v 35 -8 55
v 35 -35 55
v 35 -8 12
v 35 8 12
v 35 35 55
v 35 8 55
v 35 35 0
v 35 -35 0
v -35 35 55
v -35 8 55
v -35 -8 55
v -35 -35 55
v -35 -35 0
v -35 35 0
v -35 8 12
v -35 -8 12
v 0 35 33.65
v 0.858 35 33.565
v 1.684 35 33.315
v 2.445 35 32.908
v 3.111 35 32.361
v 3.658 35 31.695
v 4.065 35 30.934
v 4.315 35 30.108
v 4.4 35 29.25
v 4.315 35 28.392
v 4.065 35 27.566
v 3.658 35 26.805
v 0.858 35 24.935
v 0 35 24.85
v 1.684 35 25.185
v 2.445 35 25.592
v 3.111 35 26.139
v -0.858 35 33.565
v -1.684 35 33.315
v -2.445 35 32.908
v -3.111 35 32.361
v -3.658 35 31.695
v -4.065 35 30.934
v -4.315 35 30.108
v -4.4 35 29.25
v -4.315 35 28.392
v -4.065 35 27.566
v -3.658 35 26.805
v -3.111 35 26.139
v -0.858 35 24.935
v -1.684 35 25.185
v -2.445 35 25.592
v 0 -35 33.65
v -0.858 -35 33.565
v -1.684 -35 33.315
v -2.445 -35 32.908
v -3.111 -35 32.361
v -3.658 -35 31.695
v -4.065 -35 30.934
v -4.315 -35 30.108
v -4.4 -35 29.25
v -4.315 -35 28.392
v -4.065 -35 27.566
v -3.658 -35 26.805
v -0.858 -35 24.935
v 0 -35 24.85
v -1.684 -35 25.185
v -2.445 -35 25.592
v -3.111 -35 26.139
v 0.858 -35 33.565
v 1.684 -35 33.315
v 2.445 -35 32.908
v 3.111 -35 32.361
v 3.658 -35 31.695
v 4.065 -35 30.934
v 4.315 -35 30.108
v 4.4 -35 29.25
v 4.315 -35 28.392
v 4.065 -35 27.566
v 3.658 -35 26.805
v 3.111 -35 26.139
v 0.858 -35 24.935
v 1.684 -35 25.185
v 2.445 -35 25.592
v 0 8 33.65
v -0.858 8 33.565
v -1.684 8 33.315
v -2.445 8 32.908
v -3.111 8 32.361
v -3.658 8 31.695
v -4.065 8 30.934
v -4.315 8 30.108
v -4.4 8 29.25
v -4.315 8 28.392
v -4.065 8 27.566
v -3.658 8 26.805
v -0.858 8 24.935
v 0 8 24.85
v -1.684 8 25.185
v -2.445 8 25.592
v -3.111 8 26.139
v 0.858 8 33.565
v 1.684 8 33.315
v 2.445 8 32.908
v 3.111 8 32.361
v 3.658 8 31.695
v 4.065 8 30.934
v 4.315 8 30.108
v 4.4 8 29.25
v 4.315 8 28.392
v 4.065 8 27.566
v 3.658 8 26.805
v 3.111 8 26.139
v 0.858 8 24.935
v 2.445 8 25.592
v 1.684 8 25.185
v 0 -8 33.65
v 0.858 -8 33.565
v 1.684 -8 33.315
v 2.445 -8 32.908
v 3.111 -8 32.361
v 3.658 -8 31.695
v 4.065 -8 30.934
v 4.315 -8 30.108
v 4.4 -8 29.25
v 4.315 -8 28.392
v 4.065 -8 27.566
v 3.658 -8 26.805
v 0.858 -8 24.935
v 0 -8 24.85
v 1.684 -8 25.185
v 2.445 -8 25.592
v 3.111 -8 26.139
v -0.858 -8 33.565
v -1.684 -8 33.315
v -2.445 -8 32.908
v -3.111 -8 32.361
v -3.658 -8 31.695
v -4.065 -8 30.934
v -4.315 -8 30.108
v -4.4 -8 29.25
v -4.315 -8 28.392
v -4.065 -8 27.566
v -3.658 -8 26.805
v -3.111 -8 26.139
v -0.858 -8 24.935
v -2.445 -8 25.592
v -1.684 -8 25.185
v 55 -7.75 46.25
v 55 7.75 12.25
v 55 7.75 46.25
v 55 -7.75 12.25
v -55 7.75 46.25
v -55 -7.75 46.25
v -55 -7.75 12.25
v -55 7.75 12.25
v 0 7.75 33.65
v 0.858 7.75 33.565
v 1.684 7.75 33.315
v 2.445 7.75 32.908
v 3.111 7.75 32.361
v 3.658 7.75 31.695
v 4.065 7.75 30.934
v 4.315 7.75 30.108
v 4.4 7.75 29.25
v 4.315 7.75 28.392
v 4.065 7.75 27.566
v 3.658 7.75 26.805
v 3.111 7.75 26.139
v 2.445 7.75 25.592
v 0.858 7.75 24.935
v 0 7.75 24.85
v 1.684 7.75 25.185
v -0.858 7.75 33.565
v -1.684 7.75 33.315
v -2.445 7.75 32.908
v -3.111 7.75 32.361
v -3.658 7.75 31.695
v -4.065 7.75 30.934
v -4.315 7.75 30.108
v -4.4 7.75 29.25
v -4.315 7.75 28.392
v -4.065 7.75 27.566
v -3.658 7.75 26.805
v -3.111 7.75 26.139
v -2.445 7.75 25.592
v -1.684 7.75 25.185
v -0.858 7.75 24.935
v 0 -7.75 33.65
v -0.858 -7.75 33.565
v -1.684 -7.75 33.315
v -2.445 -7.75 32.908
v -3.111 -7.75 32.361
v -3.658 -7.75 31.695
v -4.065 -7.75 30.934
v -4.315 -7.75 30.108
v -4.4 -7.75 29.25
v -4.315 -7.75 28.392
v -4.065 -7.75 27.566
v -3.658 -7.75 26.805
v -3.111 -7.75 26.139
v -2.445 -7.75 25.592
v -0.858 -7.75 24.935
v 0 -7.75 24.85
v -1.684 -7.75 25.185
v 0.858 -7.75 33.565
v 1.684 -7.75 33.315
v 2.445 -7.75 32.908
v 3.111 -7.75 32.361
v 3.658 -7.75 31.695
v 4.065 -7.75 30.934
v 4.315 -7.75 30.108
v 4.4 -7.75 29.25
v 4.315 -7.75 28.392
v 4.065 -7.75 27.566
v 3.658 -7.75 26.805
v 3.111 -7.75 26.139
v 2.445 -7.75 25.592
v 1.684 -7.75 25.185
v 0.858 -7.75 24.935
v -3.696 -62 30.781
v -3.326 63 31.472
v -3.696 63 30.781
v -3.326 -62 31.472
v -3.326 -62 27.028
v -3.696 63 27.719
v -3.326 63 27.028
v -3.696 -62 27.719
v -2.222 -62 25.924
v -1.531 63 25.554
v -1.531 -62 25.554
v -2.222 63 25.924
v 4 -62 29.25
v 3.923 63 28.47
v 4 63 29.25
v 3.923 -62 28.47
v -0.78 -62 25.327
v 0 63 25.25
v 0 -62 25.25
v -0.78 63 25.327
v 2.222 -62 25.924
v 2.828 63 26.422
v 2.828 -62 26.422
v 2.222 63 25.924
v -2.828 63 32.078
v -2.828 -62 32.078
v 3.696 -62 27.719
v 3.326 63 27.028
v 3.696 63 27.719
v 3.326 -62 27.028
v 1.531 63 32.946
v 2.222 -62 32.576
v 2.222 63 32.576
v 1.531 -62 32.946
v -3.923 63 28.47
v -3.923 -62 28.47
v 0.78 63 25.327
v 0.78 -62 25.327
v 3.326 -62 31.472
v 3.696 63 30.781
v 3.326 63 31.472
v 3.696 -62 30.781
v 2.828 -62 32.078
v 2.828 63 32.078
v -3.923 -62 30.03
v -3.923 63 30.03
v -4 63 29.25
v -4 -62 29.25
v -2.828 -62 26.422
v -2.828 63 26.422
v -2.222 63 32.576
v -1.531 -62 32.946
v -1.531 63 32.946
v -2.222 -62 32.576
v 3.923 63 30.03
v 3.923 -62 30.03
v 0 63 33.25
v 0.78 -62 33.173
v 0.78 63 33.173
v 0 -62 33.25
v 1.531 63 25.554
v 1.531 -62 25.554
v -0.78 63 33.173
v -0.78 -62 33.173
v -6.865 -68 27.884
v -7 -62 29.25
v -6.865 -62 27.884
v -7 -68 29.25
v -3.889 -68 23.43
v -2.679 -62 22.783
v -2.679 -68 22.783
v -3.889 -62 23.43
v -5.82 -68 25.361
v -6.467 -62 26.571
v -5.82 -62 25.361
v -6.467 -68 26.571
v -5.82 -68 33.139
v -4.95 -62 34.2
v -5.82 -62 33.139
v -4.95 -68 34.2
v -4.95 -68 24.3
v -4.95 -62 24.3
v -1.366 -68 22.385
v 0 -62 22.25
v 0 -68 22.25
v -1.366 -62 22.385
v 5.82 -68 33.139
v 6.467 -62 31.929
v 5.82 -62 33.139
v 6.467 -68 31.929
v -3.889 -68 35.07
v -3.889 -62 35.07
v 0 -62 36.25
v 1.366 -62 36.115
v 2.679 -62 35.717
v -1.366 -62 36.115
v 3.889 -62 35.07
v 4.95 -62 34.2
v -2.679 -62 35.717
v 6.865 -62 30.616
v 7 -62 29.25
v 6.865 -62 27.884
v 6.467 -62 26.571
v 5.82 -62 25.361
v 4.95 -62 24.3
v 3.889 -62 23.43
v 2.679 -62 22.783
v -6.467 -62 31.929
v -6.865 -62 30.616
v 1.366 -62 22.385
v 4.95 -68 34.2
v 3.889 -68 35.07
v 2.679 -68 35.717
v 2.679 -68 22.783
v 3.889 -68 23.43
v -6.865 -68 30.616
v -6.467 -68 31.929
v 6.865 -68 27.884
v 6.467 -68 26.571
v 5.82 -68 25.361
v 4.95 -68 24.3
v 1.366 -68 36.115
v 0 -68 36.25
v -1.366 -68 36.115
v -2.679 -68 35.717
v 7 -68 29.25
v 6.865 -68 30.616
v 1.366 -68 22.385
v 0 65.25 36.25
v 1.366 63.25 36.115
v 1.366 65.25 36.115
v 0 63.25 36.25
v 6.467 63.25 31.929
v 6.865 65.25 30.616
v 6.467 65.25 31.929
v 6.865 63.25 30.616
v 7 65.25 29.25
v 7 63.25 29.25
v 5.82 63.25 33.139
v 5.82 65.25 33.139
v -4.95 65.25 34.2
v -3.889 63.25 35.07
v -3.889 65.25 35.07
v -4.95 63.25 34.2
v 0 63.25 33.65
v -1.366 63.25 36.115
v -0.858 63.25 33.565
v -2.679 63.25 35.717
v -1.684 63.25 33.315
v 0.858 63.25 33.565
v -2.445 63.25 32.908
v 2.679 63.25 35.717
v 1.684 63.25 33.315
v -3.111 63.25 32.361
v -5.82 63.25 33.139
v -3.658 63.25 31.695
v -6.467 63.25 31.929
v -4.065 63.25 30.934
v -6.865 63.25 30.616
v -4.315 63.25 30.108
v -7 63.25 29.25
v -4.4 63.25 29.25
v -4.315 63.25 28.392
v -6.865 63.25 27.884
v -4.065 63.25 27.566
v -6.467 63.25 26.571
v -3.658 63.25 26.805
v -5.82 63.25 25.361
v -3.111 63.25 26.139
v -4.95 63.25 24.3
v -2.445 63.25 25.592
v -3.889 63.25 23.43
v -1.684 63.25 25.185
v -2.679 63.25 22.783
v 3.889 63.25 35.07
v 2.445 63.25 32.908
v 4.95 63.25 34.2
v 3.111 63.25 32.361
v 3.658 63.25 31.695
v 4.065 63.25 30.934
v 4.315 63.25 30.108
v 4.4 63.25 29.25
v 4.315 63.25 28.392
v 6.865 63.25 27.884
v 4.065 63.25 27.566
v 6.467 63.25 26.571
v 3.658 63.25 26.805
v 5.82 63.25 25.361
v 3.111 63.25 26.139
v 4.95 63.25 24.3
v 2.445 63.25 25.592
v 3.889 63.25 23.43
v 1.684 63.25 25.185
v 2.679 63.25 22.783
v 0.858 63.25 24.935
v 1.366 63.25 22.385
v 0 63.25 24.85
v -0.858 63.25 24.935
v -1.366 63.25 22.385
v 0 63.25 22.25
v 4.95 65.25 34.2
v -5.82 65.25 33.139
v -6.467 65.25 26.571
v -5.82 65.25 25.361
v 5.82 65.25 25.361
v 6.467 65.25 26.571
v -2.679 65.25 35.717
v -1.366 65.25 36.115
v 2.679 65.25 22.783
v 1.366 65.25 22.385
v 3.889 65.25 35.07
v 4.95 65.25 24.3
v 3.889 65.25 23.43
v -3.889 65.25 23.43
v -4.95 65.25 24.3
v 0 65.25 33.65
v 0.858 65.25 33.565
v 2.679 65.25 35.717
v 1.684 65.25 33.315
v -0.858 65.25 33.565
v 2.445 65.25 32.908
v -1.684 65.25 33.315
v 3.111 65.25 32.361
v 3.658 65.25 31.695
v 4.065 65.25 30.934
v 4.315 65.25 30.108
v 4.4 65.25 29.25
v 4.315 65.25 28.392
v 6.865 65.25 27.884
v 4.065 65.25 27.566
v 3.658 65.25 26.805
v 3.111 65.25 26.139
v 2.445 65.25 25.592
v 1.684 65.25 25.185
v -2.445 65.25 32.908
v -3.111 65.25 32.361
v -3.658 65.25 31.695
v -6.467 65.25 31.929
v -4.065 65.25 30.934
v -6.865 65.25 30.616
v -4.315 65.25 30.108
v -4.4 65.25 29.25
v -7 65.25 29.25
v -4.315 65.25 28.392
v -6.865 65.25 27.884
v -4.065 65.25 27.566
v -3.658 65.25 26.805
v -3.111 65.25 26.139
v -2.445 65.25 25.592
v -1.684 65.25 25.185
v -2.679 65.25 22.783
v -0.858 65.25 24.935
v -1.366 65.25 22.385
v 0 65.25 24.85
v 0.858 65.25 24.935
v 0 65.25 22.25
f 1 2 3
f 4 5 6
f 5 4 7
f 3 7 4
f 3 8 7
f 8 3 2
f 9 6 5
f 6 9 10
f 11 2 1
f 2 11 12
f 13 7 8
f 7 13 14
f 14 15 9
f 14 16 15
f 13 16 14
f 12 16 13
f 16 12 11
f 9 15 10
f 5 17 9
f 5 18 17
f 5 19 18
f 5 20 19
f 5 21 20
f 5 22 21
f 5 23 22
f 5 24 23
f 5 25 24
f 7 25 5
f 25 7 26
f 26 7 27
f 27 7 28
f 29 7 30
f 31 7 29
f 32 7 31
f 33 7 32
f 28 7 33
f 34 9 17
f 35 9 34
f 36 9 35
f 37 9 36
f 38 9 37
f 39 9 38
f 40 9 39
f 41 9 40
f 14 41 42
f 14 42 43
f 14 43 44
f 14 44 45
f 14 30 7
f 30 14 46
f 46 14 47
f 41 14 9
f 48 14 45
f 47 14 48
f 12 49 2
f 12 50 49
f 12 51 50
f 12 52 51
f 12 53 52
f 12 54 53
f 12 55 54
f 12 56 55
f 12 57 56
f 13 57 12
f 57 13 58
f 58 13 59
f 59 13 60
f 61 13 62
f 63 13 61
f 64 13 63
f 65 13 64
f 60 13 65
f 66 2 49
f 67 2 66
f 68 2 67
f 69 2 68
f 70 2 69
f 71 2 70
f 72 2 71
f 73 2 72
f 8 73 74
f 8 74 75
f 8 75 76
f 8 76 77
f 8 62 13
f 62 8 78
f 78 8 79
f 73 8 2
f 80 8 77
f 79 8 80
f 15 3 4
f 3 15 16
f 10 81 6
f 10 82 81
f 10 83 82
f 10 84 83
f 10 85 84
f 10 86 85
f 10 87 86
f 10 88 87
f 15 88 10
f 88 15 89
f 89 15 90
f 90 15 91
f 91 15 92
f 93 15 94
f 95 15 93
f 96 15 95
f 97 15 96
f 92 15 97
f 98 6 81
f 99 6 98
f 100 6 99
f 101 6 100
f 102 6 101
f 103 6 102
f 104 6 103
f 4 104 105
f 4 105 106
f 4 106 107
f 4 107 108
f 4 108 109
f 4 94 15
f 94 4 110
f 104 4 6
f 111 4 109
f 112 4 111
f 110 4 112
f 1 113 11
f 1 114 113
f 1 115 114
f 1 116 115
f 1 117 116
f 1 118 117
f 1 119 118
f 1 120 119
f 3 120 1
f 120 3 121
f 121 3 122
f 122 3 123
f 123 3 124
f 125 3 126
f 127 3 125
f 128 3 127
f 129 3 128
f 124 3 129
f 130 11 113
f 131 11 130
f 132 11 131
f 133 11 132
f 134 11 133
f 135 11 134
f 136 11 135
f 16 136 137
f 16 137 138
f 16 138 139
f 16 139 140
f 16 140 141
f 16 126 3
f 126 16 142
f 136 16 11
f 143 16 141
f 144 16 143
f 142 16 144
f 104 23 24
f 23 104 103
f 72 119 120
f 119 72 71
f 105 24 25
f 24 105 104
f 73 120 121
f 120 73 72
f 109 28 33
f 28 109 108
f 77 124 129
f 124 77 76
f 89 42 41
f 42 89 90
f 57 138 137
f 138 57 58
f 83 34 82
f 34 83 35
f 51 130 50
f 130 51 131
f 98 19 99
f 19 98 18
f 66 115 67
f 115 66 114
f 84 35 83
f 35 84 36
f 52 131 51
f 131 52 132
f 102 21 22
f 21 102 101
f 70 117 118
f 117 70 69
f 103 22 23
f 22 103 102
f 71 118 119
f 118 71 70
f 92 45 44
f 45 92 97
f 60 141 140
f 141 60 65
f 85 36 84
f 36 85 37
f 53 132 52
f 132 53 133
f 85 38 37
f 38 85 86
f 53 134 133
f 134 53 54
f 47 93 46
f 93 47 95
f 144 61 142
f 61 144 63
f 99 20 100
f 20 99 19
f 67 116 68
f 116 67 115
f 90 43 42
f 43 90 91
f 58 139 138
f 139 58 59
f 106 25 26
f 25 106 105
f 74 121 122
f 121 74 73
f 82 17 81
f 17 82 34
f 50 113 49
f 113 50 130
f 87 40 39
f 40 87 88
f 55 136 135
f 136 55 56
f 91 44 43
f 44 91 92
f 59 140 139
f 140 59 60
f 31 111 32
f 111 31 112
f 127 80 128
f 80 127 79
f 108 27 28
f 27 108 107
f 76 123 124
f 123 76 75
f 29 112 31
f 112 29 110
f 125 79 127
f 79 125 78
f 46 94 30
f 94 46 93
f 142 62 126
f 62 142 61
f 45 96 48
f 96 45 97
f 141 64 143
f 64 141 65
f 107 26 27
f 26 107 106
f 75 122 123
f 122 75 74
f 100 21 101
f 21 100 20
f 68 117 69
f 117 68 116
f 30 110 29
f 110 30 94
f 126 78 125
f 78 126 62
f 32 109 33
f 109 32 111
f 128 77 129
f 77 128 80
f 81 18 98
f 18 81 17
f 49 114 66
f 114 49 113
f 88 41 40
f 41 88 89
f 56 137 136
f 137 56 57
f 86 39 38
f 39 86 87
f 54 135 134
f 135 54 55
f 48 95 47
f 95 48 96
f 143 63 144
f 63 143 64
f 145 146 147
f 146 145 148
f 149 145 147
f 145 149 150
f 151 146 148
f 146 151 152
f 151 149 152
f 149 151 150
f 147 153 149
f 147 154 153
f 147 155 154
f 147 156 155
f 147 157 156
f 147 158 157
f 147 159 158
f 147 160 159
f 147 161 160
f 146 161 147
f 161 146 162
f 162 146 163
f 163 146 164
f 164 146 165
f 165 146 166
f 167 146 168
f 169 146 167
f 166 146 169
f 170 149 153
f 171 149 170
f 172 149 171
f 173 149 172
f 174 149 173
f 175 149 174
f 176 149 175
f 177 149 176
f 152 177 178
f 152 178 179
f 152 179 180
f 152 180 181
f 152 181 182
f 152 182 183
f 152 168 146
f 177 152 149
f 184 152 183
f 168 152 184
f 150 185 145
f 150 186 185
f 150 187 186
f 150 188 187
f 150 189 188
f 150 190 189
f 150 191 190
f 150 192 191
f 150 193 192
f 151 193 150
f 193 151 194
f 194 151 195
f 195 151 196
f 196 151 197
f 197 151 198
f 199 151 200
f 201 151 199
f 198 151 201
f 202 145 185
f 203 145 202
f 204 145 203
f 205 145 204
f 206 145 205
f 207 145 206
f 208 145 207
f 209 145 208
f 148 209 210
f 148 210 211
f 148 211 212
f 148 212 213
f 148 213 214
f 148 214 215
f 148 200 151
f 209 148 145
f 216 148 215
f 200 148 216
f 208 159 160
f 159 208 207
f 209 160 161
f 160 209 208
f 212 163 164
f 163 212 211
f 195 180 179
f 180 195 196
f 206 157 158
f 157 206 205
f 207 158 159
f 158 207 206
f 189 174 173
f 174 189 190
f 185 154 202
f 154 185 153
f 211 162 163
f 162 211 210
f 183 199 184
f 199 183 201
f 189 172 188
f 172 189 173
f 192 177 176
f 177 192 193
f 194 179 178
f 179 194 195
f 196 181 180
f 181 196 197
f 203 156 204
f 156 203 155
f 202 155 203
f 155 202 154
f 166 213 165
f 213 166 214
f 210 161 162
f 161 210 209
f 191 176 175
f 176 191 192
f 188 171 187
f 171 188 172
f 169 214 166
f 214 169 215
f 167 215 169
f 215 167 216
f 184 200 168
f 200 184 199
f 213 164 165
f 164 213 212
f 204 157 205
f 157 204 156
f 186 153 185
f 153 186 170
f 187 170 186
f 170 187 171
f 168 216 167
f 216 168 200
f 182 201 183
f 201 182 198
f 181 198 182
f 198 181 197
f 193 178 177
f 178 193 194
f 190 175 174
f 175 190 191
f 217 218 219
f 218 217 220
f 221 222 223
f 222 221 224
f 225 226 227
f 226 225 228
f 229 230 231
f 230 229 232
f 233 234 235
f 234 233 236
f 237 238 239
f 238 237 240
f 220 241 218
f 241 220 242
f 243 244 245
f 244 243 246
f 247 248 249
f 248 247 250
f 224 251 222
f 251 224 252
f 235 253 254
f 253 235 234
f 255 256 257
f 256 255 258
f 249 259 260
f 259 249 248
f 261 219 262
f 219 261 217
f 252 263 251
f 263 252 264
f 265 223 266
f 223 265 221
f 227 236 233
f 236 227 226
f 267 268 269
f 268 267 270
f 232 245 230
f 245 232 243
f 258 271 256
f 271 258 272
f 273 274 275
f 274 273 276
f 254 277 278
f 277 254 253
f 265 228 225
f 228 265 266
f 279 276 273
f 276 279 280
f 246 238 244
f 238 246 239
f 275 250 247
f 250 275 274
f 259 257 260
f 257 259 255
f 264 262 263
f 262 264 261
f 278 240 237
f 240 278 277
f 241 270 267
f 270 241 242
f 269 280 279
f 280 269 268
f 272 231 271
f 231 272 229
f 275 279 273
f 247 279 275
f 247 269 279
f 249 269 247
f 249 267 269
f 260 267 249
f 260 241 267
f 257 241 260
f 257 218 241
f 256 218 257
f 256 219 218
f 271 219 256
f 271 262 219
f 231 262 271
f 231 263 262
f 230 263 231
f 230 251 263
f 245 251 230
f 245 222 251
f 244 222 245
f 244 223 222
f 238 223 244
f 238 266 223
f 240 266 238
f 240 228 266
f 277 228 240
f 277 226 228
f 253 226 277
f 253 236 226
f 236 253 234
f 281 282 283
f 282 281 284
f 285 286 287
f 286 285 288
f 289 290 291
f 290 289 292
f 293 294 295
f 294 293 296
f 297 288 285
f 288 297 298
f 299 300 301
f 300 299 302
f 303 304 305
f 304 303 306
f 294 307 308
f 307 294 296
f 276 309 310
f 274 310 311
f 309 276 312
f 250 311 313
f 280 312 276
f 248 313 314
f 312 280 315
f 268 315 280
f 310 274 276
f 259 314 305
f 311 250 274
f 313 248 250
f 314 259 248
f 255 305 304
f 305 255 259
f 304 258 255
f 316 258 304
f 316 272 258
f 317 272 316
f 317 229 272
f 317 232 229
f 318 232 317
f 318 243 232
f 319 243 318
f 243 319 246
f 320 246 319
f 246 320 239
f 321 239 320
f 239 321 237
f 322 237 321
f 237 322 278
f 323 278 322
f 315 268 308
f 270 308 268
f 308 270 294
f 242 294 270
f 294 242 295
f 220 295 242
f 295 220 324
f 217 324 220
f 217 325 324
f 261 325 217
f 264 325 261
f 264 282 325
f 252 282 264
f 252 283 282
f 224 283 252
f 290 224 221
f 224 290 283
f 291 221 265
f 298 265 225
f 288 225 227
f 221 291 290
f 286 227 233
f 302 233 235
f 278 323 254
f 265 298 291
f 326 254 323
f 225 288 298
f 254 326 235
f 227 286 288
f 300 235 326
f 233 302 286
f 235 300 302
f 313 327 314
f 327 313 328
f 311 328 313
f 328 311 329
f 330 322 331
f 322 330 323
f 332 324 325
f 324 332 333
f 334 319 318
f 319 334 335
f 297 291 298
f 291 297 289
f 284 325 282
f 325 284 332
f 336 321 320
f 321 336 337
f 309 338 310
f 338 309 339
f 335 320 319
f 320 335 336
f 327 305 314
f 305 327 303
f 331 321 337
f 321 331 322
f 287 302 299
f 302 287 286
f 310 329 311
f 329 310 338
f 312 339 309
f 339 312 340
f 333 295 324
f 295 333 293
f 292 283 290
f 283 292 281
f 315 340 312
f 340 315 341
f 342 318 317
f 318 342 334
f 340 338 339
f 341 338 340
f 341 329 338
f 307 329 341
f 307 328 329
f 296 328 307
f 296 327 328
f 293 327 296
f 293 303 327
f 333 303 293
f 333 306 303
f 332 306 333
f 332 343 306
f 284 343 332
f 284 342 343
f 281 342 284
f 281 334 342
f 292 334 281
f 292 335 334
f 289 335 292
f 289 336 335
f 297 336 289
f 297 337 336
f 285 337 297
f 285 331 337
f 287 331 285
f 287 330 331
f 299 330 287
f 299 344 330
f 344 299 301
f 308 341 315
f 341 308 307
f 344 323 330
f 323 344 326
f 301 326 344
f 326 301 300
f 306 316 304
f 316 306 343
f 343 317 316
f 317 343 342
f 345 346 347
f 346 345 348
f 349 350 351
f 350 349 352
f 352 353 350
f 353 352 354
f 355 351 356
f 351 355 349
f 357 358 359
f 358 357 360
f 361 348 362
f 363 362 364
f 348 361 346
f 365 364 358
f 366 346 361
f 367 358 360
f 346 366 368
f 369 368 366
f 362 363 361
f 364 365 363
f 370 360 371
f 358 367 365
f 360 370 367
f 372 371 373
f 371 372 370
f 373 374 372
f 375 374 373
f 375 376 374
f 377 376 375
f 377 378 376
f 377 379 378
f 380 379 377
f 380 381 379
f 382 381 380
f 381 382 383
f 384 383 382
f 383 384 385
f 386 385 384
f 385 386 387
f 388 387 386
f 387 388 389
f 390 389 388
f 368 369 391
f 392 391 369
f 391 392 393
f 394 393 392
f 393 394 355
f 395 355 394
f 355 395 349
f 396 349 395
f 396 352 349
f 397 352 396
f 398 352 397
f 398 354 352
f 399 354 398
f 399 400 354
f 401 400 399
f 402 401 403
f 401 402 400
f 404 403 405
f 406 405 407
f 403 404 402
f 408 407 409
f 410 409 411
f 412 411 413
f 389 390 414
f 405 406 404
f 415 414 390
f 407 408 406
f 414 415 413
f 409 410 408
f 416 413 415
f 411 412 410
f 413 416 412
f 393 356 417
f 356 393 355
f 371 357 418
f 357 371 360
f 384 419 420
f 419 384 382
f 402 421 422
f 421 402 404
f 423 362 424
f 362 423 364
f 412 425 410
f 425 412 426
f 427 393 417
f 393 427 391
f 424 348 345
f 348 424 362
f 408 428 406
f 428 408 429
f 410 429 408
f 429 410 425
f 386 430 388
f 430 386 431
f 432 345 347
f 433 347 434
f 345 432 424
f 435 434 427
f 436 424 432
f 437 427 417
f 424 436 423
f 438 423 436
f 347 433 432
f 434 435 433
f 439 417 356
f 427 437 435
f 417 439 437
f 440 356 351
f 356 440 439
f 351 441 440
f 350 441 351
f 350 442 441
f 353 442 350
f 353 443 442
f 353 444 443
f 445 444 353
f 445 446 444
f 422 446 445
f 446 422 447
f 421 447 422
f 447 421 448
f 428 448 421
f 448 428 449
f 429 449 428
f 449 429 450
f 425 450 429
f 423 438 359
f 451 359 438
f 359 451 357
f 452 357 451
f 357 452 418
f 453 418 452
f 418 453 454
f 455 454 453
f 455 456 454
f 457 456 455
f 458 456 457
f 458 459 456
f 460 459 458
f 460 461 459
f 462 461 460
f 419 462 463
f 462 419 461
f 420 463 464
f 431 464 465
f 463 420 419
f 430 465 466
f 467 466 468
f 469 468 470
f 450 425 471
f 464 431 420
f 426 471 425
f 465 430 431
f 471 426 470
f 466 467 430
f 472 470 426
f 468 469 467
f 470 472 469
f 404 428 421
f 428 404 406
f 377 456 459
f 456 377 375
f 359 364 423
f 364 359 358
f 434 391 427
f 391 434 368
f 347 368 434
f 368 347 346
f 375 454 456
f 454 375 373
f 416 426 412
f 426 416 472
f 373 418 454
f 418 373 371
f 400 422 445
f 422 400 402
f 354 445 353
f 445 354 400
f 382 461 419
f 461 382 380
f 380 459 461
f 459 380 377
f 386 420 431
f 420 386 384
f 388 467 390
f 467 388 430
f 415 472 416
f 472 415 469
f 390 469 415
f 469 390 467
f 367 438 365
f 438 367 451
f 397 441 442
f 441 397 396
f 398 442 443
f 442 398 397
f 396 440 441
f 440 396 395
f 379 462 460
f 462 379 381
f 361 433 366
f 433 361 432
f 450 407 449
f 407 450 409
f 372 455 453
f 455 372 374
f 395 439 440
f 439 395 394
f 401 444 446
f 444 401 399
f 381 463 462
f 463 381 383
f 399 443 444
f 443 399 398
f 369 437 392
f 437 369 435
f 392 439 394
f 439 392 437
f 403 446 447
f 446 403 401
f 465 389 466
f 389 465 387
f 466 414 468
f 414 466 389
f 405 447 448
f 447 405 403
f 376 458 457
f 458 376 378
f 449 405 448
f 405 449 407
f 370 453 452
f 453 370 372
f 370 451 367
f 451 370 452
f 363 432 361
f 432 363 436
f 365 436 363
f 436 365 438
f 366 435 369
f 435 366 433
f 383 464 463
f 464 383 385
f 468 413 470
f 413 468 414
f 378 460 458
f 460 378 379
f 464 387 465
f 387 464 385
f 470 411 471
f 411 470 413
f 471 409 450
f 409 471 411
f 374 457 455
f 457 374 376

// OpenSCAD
$fn = 32;

// ------------------------------------------------------------------------
// Clevis joint: 70 mm clevis, pin d8
// Every part is its own module, assembly() places them once.
// ------------------------------------------------------------------------

// --- part 1 ---
module clevis() {
  difference() {
    translate([-35, -35, 0]) cube([70, 70, 55]);
    translate([-36, -8, 12]) cube([72, 16, 44]);
    translate([0, 0, 29.25]) rotate([90, 0, 0]) cylinder(h = 72, d = 8.8, center = true);
  }
}

// --- part 2 ---
module eye() {
  difference() {
    translate([-55, -7.75, 0]) cube([110, 15.5, 34]);
    translate([0, 0, 17]) rotate([90, 0, 0]) cylinder(h = 17.5, d = 8.8, center = true);
  }
}

// --- part 3 ---
module pin() {
  rotate([0, 90, 0]) cylinder(h = 126, d = 8, center = true);
  translate([-68, 0, 0]) rotate([0, 90, 0]) cylinder(h = 6, d = 14);
}

// --- part 4 ---
module retainer() {
  difference() {
      translate([0, 0, 0]) cylinder(h = 2, d = 14);
      translate([0, 0, -1]) cylinder(h = 4, d = 8.8);
    }
}

// --- assembly ---
module assembly() {
  translate([0, 0, 0]) rotate([0, 0, 0]) clevis();
  translate([0, 0, 12.25]) rotate([0, 0, 0]) eye();
  translate([0, 0, 29.25]) rotate([0, 0, 90]) pin();
  translate([0, 65.25, 29.25]) rotate([90, 0, 0]) retainer();
}

assembly();
